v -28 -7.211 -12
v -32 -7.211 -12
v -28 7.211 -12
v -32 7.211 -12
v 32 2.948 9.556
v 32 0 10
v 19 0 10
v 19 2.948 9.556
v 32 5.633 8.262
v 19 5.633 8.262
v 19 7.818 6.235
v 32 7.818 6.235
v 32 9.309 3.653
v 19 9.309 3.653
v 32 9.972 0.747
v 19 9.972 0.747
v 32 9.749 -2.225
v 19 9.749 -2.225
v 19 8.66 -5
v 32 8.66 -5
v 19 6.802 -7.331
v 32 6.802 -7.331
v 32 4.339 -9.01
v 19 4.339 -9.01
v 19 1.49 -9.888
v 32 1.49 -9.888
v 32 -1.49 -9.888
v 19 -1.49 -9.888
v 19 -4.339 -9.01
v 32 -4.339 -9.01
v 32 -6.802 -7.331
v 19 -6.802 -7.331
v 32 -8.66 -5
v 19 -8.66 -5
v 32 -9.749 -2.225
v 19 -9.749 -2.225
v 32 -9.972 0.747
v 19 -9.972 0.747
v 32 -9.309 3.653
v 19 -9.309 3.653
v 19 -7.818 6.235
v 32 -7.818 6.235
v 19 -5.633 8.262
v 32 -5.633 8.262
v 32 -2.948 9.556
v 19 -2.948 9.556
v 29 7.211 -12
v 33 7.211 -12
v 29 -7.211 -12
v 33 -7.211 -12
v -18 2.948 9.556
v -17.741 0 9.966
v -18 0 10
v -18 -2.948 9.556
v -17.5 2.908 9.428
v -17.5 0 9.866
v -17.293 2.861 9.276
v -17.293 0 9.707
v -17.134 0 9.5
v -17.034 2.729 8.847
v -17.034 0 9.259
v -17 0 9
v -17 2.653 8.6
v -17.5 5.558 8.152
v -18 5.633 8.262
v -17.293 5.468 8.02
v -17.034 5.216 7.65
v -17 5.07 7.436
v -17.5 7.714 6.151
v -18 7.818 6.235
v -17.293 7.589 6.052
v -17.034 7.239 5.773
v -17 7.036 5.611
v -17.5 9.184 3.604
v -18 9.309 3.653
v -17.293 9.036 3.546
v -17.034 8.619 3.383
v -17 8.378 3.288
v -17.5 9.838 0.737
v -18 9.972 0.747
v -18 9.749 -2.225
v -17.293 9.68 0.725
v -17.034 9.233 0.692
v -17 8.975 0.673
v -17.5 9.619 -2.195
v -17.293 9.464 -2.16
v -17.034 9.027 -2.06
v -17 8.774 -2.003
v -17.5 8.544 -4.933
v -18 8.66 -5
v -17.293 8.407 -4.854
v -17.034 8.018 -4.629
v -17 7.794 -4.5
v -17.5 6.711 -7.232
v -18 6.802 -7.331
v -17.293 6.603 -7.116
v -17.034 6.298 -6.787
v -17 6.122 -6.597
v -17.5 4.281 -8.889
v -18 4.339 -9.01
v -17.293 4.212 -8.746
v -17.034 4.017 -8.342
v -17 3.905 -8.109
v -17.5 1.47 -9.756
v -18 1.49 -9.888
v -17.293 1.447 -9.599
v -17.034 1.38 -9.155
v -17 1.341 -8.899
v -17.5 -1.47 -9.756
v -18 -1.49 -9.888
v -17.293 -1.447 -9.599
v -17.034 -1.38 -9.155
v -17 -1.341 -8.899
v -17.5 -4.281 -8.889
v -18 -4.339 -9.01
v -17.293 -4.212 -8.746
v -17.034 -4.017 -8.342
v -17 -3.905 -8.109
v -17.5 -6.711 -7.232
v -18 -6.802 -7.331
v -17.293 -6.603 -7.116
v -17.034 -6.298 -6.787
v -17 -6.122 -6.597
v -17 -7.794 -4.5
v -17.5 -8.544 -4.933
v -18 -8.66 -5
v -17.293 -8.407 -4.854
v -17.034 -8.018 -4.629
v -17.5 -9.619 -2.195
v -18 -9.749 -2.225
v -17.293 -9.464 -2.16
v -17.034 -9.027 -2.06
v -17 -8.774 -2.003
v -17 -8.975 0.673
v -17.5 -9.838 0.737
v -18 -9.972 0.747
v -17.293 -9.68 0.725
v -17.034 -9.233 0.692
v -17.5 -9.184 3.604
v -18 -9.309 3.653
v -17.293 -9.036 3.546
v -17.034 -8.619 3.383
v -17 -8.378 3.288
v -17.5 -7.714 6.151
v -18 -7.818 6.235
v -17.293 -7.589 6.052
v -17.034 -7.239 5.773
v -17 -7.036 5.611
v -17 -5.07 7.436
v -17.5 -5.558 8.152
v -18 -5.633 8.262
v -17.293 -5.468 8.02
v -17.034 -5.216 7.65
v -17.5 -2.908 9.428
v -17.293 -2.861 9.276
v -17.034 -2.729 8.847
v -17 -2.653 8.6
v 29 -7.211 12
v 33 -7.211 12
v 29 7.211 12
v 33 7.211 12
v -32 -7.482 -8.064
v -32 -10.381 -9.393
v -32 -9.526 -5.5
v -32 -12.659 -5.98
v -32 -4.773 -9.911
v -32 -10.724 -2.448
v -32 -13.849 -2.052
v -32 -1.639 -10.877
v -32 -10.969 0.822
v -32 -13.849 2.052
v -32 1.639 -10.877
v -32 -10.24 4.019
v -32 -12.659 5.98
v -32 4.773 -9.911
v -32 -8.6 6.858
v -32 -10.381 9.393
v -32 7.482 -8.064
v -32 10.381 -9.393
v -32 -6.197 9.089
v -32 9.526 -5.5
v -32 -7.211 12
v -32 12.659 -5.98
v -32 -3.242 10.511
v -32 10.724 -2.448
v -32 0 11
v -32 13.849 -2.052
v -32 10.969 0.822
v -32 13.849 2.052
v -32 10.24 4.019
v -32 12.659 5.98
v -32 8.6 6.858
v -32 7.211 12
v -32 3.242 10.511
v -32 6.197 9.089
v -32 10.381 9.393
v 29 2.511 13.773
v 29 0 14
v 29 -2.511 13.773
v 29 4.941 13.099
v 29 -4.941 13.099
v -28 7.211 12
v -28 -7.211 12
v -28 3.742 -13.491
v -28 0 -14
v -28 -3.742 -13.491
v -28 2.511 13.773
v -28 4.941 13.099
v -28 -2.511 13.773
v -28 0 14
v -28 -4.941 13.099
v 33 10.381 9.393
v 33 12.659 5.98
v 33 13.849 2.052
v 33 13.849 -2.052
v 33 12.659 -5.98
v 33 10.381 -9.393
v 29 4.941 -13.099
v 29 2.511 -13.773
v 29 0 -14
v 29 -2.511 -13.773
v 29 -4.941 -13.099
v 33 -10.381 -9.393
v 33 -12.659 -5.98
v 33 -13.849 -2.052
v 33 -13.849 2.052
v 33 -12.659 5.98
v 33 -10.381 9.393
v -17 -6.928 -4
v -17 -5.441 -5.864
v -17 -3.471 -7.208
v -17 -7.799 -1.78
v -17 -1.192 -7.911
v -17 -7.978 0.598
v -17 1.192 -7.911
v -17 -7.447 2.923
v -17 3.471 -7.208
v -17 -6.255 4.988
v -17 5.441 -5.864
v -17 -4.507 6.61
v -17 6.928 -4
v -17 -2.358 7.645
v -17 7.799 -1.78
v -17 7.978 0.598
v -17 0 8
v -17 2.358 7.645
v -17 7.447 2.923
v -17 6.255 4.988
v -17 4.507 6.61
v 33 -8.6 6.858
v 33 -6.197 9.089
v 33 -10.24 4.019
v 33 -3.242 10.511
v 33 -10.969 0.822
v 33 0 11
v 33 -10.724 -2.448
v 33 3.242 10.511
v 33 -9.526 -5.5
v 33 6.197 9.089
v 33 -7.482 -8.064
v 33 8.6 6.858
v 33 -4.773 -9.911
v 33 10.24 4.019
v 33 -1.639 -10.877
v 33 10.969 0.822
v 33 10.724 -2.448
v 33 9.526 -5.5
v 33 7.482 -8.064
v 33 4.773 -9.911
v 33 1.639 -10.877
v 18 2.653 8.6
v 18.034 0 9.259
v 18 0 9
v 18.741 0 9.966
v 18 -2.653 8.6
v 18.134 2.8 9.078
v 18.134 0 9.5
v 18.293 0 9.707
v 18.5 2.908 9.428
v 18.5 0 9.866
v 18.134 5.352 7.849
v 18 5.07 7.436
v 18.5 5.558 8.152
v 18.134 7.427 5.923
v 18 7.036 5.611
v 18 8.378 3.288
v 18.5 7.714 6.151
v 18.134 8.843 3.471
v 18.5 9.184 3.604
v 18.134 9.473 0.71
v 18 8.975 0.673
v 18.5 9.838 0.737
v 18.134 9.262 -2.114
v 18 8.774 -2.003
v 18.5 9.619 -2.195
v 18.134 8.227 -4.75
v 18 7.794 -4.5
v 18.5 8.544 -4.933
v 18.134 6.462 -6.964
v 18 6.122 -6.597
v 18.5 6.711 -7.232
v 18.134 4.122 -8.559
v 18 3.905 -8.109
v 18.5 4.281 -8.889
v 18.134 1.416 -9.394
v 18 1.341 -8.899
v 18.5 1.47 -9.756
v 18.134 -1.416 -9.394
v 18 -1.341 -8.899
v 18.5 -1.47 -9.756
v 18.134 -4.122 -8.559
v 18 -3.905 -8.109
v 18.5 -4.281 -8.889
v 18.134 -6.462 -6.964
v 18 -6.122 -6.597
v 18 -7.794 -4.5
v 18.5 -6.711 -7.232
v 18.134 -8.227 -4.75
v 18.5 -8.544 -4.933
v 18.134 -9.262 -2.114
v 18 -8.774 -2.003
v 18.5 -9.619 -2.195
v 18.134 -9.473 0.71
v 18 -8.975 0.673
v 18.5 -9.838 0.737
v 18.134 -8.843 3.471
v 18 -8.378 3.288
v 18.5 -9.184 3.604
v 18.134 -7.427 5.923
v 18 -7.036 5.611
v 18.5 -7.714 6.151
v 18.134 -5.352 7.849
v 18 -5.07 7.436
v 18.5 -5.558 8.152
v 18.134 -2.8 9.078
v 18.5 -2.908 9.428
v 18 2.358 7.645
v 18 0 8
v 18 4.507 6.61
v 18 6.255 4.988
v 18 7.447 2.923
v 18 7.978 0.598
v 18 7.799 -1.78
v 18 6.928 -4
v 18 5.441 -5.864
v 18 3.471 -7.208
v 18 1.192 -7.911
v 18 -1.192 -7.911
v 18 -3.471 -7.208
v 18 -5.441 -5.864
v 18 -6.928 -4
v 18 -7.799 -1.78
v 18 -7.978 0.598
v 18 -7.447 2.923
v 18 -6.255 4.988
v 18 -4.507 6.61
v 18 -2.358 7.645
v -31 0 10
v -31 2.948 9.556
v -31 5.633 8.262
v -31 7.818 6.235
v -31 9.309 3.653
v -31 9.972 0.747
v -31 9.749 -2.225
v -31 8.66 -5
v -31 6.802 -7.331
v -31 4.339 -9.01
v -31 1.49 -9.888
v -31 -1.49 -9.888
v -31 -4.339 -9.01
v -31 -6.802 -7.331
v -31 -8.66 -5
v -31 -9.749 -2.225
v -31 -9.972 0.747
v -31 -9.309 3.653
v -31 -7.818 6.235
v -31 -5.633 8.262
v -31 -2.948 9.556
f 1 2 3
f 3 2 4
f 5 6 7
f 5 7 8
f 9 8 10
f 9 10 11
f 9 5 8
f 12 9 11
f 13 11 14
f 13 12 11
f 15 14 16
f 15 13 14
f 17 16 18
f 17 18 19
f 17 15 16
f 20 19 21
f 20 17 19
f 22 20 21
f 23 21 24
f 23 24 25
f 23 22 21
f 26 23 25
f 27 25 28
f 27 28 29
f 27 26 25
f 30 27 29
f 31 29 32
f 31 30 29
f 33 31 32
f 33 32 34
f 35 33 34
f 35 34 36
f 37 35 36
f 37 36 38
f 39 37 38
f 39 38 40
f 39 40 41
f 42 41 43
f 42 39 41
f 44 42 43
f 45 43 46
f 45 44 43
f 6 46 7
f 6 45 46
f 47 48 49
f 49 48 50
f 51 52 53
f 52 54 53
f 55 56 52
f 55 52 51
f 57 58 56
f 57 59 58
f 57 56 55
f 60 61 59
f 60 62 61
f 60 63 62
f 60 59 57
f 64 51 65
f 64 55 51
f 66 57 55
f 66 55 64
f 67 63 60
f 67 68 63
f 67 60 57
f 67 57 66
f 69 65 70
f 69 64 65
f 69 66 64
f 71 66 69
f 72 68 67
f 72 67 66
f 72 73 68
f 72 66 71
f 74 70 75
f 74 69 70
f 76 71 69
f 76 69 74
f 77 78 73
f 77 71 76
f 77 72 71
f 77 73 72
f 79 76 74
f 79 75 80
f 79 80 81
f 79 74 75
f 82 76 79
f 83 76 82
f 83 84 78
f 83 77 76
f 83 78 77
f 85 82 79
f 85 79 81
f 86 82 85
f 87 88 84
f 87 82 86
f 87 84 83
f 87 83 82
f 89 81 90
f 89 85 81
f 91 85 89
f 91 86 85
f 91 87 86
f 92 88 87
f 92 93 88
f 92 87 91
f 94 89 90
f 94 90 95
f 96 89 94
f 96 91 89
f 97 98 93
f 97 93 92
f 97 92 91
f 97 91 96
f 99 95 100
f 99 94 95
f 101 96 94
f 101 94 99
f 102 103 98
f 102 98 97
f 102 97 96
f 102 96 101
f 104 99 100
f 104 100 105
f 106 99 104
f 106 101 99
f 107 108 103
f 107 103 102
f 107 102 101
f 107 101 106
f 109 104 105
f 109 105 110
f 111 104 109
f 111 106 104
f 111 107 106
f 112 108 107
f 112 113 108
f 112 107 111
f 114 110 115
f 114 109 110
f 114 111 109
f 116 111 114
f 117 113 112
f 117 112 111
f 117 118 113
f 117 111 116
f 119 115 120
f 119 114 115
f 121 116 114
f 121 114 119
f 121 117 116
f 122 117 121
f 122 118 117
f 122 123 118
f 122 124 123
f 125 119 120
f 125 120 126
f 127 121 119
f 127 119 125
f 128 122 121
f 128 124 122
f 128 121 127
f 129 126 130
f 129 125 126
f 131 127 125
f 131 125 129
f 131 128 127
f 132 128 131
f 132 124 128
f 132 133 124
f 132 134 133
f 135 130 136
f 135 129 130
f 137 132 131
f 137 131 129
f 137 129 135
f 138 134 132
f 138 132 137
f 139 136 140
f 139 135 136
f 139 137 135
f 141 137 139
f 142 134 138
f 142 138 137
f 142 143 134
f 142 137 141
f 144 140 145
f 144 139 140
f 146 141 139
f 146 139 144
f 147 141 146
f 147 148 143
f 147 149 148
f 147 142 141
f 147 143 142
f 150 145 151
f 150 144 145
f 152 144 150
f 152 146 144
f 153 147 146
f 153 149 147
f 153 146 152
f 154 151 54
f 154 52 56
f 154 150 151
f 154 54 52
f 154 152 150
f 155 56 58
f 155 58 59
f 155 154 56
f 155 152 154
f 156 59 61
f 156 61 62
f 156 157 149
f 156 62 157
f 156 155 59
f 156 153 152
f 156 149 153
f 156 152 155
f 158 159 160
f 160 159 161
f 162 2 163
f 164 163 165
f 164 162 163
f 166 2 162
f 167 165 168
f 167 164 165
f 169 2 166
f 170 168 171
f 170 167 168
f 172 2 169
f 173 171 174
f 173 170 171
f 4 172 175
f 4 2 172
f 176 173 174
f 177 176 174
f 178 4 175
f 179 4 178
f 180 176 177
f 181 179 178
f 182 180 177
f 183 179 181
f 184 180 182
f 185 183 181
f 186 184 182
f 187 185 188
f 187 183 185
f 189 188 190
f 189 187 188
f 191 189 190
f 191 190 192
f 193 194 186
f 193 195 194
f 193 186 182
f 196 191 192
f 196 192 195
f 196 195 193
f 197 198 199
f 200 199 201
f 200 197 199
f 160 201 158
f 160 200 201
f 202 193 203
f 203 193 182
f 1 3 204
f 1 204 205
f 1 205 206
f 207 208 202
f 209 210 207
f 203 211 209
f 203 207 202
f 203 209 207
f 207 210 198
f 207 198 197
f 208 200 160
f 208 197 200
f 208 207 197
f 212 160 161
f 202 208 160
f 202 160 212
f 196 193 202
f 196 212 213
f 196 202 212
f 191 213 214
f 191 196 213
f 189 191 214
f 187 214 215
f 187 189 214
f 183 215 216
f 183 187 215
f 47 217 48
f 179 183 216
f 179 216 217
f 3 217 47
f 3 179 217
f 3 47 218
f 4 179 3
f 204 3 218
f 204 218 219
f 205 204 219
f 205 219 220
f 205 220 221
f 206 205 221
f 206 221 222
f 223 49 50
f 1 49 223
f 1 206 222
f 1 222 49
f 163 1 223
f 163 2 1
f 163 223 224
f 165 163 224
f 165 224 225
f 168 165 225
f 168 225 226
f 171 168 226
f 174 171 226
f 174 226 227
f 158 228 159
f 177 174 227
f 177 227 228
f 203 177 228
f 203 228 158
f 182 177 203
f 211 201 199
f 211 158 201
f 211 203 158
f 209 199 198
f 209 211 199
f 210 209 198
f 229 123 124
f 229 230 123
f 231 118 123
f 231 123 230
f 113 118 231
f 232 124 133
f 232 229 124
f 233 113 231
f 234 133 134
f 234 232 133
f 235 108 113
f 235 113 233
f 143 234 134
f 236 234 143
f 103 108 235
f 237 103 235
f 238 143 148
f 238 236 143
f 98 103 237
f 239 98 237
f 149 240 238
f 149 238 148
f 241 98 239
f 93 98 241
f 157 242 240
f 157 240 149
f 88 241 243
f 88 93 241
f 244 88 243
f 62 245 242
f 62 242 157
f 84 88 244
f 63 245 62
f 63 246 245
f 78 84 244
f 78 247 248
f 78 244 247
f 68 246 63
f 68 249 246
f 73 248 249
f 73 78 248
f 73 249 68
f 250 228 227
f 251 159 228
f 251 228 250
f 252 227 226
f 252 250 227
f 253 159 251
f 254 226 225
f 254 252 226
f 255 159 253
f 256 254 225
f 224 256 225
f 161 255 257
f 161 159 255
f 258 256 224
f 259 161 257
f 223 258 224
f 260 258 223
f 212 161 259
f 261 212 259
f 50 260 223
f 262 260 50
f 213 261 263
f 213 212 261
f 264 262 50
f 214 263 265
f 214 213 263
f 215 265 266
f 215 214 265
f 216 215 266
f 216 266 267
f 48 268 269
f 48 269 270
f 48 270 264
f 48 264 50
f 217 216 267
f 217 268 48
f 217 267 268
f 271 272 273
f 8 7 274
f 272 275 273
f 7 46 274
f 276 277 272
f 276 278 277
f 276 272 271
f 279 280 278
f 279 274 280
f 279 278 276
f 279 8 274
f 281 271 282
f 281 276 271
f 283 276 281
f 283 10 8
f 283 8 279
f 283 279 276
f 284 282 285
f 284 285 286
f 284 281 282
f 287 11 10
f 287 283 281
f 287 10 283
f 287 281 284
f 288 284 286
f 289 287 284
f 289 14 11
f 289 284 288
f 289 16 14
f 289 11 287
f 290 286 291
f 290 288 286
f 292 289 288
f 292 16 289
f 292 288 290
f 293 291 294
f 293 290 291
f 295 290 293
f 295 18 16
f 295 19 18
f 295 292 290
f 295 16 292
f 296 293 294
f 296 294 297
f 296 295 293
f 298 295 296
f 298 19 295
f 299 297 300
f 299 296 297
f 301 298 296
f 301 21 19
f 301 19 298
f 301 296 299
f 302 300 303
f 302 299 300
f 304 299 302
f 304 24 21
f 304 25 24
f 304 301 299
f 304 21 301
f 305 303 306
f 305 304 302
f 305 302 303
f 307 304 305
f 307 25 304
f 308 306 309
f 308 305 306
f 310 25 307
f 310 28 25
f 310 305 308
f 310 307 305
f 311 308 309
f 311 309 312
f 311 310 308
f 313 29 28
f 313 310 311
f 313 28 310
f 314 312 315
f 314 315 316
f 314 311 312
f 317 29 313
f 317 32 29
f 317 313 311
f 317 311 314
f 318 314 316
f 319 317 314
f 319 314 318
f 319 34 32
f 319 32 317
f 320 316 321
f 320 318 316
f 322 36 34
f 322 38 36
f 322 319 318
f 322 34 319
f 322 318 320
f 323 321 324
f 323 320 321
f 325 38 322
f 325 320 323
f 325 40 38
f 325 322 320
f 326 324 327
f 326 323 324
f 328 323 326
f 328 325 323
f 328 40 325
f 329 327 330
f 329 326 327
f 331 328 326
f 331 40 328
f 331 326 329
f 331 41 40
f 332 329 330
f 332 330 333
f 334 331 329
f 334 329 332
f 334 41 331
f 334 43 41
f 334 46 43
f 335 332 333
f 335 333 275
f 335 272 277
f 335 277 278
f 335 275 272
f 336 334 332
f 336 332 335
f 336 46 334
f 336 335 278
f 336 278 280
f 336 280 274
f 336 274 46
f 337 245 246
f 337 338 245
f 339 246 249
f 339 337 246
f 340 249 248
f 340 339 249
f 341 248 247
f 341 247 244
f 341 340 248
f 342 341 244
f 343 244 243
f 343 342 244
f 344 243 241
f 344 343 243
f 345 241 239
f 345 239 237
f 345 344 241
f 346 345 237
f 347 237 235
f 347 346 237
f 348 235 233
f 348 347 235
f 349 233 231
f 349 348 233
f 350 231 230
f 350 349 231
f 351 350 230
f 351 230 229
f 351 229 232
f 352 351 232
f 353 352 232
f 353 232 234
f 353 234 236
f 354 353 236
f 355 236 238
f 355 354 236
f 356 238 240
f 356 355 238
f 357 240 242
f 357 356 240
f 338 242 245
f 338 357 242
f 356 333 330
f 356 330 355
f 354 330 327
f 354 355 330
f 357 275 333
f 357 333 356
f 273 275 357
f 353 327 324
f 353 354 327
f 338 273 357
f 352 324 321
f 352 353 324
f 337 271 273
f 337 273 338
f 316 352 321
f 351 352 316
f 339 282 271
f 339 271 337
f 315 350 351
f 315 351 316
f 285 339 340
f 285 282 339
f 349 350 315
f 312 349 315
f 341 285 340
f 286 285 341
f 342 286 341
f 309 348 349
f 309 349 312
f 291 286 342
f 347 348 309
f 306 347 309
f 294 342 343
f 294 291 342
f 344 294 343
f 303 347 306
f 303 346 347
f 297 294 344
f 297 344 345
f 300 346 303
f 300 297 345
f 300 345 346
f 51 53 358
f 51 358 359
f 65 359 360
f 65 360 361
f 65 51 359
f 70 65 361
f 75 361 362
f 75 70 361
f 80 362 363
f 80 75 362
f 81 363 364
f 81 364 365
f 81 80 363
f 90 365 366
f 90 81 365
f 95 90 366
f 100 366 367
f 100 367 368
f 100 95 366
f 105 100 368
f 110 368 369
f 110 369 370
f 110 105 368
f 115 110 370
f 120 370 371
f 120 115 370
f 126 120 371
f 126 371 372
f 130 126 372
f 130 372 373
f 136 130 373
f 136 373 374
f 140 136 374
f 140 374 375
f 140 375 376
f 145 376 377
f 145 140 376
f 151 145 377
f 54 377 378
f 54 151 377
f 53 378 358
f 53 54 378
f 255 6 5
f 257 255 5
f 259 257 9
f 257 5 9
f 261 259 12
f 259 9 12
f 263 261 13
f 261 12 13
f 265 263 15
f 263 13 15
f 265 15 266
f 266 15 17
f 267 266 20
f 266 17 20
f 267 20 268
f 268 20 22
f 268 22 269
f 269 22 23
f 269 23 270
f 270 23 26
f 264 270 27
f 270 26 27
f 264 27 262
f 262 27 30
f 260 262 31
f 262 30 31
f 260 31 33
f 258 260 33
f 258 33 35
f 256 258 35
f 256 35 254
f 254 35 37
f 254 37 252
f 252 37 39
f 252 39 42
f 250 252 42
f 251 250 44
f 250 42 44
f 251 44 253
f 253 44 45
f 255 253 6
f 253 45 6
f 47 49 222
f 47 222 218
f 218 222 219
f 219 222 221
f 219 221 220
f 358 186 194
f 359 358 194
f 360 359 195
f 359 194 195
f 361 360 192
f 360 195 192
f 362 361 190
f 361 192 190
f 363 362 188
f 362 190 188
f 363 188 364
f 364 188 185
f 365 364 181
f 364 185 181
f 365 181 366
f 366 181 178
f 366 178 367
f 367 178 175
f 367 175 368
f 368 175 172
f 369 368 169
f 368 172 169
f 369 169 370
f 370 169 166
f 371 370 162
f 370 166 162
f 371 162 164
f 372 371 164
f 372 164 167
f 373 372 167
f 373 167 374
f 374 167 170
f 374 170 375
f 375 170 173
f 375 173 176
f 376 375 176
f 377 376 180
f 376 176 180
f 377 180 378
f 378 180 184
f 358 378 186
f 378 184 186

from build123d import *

# Parameters (mm, degrees)
F2_R     = 1
F3_SIZE  = 1
F5_DEPTH = 4
F7_DEPTH = 4


with BuildPart() as f1:
    # F0 (on Front) → F1 (revolve)
    with BuildSketch(Plane.XZ):
        Polygon((-32, 14), (-32, 10), (-17, 10), (-17, 8), (18, 8), (18, 10), (33, 10), (33, 14), align=None)
    revolve(axis=Axis((4.3690800667, 0, 0), (-1, 0, 0)))

    # F2
    f2_edges = [f1.edges().sort_by_distance(p)[0] for p in [
        (18, 0, -10),
        (-17, 0, -10),
    ]]
    fillet(f2_edges, radius=F2_R)

    # F3
    f3_edges = [f1.edges().sort_by_distance(p)[0] for p in [
        (-32, 0, -10),
        (33, 0, -10),
    ]]
    chamfer(f3_edges, length=F3_SIZE)

    # F4 (on face) → F5 (cut)
    with BuildSketch(Plane(origin=(-32, 0, 0), x_dir=(0, -1, 0), z_dir=(-1, 0, 0))):
        with BuildLine():
            Line((0, 14), (-10, 14))
            Line((-10, 14), (-10, 12))
            Line((-10, 12), (-7.2111025509, 12))
            ThreePointArc((-7.2111025509, 12), (-3.7416573868, 13.4907375632), (0, 14))
        make_face()
        with BuildLine():
            ThreePointArc((7.2111025509, 12), (3.7416573868, 13.4907375632), (0, 14))
            ThreePointArc((0, 14), (-3.7416573868, 13.4907375632), (-7.2111025509, 12))
            Line((-7.2111025509, 12), (7.2111025509, 12))
        make_face()
        with BuildLine():
            Line((10, 14), (0, 14))
            ThreePointArc((0, 14), (3.7416573868, 13.4907375632), (7.2111025509, 12))
            Line((7.2111025509, 12), (10, 12))
            Line((10, 12), (10, 14))
        make_face()
        with BuildLine():
            ThreePointArc((0, -14), (-3.7416573868, -13.4907375632), (-7.2111025509, -12))
            Line((-7.2111025509, -12), (-10, -12))
            Line((-10, -12), (-10, -14))
            Line((-10, -14), (0, -14))
        make_face()
        with BuildLine():
            Line((7.2111025509, -12), (-7.2111025509, -12))
            ThreePointArc((-7.2111025509, -12), (-3.7416573868, -13.4907375632), (0, -14))
            ThreePointArc((0, -14), (3.7416573868, -13.4907375632), (7.2111025509, -12))
        make_face()
        with BuildLine():
            Line((10, -12), (7.2111025509, -12))
            ThreePointArc((7.2111025509, -12), (3.7416573868, -13.4907375632), (0, -14))
            Line((0, -14), (10, -14))
            Line((10, -14), (10, -12))
        make_face()
    extrude(amount=-F5_DEPTH, mode=Mode.SUBTRACT)

    # F6 (on face) → F7 (cut)
    with BuildSketch(Plane.YZ.offset(33)):
        with BuildLine():
            ThreePointArc((7.2111025509, 12), (3.7416573868, 13.4907375632), (0, 14))
            ThreePointArc((0, 14), (-3.7416573868, 13.4907375632), (-7.2111025509, 12))
            Line((-7.2111025509, 12), (7.2111025509, 12))
        make_face()
        with BuildLine():
            Line((7.2111025509, -12), (-7.2111025509, -12))
            ThreePointArc((-7.2111025509, -12), (-3.7416573868, -13.4907375632), (0, -14))
            ThreePointArc((0, -14), (3.7416573868, -13.4907375632), (7.2111025509, -12))
        make_face()
    extrude(amount=-F7_DEPTH, mode=Mode.SUBTRACT)


solid = f1.part
